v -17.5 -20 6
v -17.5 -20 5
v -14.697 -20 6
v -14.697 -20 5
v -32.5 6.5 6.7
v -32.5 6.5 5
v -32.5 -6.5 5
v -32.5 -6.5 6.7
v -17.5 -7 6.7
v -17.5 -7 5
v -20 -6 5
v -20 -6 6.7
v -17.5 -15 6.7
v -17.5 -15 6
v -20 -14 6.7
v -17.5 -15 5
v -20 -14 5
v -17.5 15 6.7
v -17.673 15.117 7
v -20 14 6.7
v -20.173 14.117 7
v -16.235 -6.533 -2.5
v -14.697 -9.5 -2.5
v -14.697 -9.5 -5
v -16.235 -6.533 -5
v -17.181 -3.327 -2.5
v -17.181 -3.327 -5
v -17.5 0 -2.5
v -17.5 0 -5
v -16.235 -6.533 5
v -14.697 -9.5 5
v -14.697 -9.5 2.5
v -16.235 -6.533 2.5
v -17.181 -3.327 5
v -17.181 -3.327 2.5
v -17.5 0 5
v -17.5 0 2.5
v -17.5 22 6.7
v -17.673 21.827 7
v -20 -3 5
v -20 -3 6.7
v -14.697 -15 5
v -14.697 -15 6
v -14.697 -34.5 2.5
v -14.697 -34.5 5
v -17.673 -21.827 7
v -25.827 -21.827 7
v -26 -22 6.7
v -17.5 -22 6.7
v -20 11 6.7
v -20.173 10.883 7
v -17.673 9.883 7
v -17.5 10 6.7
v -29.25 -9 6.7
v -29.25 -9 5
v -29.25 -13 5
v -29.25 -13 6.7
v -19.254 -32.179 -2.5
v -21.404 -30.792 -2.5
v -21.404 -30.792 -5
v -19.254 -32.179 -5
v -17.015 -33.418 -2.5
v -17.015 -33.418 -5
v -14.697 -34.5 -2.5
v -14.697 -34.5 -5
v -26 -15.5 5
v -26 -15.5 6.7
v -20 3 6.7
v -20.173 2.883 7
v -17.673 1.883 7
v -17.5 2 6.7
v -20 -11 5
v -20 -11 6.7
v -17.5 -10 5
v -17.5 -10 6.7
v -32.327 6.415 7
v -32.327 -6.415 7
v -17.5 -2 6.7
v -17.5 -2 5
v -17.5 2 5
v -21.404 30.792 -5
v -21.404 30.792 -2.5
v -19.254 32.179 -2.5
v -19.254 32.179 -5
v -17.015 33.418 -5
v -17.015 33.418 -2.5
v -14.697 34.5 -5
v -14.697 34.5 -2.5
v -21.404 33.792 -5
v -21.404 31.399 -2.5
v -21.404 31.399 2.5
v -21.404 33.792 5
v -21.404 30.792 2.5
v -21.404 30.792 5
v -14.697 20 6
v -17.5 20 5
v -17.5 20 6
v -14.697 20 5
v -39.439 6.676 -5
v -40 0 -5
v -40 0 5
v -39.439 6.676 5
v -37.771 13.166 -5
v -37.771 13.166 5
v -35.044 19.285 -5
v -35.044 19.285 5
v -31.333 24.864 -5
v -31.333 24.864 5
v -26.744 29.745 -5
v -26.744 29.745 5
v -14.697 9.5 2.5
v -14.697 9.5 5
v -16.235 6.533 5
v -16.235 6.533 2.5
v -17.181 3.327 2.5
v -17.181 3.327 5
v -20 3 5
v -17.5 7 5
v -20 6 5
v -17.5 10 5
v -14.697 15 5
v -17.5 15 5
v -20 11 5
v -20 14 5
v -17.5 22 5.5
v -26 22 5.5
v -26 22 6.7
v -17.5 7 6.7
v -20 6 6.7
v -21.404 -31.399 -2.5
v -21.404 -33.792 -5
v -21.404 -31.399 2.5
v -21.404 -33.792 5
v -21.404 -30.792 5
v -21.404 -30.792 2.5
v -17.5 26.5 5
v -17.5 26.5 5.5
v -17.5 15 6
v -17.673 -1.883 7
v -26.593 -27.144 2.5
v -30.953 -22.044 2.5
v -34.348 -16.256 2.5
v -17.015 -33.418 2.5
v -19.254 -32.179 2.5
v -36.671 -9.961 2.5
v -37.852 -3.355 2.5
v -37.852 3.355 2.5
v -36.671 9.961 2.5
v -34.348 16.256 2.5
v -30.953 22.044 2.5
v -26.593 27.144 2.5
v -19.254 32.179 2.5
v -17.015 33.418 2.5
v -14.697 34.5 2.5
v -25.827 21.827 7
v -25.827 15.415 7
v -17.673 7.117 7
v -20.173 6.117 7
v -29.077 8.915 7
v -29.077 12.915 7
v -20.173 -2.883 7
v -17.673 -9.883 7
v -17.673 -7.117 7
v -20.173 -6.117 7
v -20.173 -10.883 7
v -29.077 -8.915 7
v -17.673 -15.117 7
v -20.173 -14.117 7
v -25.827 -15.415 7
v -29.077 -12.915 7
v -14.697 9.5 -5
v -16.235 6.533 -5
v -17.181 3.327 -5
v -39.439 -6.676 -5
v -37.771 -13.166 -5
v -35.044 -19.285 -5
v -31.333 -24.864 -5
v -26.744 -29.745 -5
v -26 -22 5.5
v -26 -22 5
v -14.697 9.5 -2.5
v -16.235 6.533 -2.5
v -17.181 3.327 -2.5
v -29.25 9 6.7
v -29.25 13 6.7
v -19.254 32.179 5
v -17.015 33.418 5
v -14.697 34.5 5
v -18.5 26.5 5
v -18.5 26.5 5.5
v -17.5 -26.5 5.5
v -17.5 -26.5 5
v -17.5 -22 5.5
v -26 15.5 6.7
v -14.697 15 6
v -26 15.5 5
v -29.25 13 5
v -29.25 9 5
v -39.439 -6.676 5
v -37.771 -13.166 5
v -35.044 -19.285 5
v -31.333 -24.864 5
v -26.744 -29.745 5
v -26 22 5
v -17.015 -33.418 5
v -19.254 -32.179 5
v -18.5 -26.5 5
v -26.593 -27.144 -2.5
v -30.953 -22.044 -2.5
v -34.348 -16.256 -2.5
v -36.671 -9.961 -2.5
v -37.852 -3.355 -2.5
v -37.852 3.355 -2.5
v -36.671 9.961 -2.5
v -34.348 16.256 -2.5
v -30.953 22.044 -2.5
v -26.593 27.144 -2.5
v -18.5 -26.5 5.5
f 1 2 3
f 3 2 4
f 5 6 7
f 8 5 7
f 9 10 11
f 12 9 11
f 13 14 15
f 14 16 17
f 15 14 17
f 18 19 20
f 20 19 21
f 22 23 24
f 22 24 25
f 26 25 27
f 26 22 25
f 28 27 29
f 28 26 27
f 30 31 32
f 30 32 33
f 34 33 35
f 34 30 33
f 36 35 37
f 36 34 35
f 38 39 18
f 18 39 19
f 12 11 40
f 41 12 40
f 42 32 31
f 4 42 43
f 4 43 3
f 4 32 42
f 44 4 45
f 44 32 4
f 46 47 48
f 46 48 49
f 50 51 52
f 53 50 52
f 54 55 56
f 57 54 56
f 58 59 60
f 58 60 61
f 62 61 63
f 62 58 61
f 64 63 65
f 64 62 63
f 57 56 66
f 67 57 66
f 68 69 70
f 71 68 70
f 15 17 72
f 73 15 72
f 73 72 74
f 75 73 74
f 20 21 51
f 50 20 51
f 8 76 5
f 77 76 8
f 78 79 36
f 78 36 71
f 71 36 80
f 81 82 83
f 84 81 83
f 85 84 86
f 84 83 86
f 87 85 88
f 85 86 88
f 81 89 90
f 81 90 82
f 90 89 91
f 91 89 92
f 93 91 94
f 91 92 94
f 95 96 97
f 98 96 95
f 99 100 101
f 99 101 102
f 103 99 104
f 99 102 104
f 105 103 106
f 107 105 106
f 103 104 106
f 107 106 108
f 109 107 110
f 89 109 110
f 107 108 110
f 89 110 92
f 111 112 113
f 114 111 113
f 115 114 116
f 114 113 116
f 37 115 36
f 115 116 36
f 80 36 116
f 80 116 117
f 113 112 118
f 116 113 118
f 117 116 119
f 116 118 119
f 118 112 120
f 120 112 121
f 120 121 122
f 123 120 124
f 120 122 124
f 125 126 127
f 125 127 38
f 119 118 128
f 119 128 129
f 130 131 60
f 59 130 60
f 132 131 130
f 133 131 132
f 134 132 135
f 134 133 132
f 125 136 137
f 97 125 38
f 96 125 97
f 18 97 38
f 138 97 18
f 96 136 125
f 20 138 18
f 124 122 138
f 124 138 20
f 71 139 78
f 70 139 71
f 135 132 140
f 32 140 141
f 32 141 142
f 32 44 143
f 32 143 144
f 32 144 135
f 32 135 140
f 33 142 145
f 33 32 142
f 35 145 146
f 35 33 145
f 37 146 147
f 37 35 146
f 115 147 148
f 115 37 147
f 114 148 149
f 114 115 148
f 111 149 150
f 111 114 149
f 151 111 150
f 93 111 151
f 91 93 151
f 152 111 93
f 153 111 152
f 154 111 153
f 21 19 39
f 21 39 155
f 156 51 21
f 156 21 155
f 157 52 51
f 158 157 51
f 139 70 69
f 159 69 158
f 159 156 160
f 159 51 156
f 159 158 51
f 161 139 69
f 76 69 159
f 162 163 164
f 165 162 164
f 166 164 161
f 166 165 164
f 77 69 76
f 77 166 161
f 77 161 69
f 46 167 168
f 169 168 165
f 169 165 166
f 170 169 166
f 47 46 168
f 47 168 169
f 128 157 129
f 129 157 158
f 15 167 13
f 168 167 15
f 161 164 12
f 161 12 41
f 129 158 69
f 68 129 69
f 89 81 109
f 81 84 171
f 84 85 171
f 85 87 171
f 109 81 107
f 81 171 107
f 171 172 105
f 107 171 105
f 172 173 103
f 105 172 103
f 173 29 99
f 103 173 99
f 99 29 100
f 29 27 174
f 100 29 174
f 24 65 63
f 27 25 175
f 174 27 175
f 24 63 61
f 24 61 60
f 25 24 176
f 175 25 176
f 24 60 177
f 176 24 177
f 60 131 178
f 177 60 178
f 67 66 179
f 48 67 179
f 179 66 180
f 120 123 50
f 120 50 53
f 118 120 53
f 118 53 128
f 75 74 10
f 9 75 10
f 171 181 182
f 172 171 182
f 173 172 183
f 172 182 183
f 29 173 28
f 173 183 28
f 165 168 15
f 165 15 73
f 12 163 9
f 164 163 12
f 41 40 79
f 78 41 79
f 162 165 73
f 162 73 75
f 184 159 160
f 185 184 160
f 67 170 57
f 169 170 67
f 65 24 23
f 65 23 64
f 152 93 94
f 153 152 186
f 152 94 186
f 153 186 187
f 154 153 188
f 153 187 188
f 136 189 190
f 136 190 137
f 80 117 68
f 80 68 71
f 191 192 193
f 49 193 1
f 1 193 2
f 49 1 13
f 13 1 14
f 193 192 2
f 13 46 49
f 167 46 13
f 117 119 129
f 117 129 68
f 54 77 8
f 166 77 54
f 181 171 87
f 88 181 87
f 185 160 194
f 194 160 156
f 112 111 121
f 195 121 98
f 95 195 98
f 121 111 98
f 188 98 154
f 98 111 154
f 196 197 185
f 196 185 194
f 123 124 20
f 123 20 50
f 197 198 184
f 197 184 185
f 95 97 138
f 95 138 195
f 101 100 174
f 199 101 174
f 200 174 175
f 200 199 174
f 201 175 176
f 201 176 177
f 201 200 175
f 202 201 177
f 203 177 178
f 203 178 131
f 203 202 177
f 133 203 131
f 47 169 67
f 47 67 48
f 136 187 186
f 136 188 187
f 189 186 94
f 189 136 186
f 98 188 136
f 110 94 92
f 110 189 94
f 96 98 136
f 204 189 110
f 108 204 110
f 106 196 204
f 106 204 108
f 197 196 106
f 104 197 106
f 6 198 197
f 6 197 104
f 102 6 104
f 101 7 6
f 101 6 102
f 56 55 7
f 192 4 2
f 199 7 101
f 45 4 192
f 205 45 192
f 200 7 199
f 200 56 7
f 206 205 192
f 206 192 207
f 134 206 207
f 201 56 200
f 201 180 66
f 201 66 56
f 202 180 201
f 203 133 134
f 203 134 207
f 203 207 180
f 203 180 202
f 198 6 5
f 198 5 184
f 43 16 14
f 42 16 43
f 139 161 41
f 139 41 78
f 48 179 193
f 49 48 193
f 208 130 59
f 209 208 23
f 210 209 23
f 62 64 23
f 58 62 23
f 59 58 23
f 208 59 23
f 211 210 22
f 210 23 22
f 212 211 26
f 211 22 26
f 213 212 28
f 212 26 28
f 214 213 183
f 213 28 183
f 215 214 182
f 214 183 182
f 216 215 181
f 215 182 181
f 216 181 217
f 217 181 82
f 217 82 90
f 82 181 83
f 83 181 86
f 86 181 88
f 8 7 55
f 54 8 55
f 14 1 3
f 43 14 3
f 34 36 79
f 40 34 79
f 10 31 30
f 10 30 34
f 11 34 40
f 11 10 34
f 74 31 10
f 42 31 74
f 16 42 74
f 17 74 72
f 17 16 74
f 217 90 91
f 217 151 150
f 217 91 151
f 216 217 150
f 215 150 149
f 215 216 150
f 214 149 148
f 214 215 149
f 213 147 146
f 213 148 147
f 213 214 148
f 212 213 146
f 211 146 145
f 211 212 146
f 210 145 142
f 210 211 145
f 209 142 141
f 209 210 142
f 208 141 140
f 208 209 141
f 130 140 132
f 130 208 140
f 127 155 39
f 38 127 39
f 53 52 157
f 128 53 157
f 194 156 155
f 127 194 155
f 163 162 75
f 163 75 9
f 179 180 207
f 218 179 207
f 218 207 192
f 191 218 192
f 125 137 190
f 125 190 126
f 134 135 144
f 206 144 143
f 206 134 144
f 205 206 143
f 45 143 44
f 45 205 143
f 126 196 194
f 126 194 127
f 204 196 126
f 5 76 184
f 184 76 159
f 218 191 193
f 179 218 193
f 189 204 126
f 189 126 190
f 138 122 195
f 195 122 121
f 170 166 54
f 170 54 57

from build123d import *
from OCP.BRepFilletAPI import BRepFilletAPI_MakeChamfer

# Parameters (mm, degrees)
BOSS_EXTRUDE1_DEPTH = 5
BOSS_EXTRUDE2_DEPTH = 2
SKETCH5_W           = 2.803061543
SKETCH5_H           = 5
BOSS_EXTRUDE3_DEPTH = 1
BOSS_EXTRUDE4_DEPTH = 0.5
SKETCH7_W           = 5
SKETCH7_H           = 38
CHAMFER1_SIZE       = 0.3
CHAMFER1_SIZE2      = 0.173205081


with BuildPart() as part:
    # Sketch2 → Boss-Extrude1 (new, symmetric)
    with BuildSketch(Plane.XY):
        with BuildLine():
            Line((-14.696938457, 34.5), (-14.696938457, 9.5))
            ThreePointArc((-14.696938457, 9.5), (-16.784612343, 4.952452777), (-17.5, 0))
            Line((-17.5, 0), (-40, 0))
            ThreePointArc((-40, 0), (-35.043919369, 19.285323831), (-21.403814237, 33.791666667))
            Line((-21.403814237, 33.791666667), (-21.403814237, 30.791666667))
            ThreePointArc((-21.403814237, 30.791666667), (-18.145358092, 32.817616911), (-14.696938457, 34.5))
        make_face()
    extrude(amount=BOSS_EXTRUDE1_DEPTH, both=True)

    # Sketch4 → Boss-Extrude2 (add)
    with BuildSketch(Plane.XY.offset(5)):
        Polygon((-17.5, 15), (-20, 14), (-20, 11), (-17.5, 10), (-17.5, 7), (-20, 6), (-20, 3), (-17.5, 2), (-17.5, 0), (-32.5, 0), (-32.5, 6.5), (-29.25, 9), (-29.25, 13), (-26, 15.5), (-26, 22), (-17.5, 22), align=None)
    extrude(amount=BOSS_EXTRUDE2_DEPTH)

    # Sketch5 → Boss-Extrude3 (add)
    with BuildSketch(Plane.XY.offset(5)):
        with Locations((-16.098469229, 17.5)):
            Rectangle(SKETCH5_W, SKETCH5_H)
    extrude(amount=BOSS_EXTRUDE3_DEPTH)

    # Sketch6 → Boss-Extrude4 (add)
    with BuildSketch(Plane.XY.offset(5)):
        Polygon((-26, 22), (-18.5, 26.5), (-17.5, 26.5), (-17.5, 22), align=None)
    extrude(amount=BOSS_EXTRUDE4_DEPTH)

    # Sketch7 → Cut-Revolve1 (revolve, cut)
    with BuildSketch(Plane(origin=(0, 0, 0), x_dir=(0, 0, -1), z_dir=(1, 0, 0))):
        with Locations((0, 19)):
            Rectangle(SKETCH7_W, SKETCH7_H)
    revolve(axis=Axis((0, 0, 2.5), (0, 0, -1)), mode=Mode.SUBTRACT)

    # Mirror1: part across plane


with BuildPart() as part_1:
    add(part.part)
    add(part.part.mirror(Plane.ZX))

    # Chamfer1: one chamfer whose edges measure the first distance from different faces: ONE call of the kernel's chamfer builder (chamfer() names one face for all edges)
    chamfer1_edges_1 = [part_1.edges().sort_by_distance(p)[0] for p in [
        (-17.5, -18.5, 7),
    ]]
    chamfer1_side_1 = [part_1.faces().sort_by_distance(p)[0] for p in [
        (-17.5, -20.094444444, 6.072222222),
    ]]
    chamfer1_edges_2 = [part_1.edges().sort_by_distance(p)[0] for p in [
        (-18.75, -2.5, 7),
    ]]
    chamfer1_side_2 = [part_1.faces().sort_by_distance(p)[0] for p in [
        (-18.75, -2.5, 6),
    ]]
    chamfer1_edges_3 = [part_1.edges().sort_by_distance(p)[0] for p in [
        (-20, -4.5, 7),
    ]]
    chamfer1_side_3 = [part_1.faces().sort_by_distance(p)[0] for p in [
        (-20, -4.5, 6),
    ]]
    chamfer1_edges_4 = [part_1.edges().sort_by_distance(p)[0] for p in [
        (-18.75, -6.5, 7),
    ]]
    chamfer1_side_4 = [part_1.faces().sort_by_distance(p)[0] for p in [
        (-18.75, -6.5, 6),
    ]]
    chamfer1_edges_5 = [part_1.edges().sort_by_distance(p)[0] for p in [
        (-17.5, -8.5, 7),
    ]]
    chamfer1_side_5 = [part_1.faces().sort_by_distance(p)[0] for p in [
        (-17.5, -8.5, 6),
    ]]
    chamfer1_edges_6 = [part_1.edges().sort_by_distance(p)[0] for p in [
        (-18.75, -10.5, 7),
    ]]
    chamfer1_side_6 = [part_1.faces().sort_by_distance(p)[0] for p in [
        (-18.75, -10.5, 6),
    ]]
    chamfer1_edges_7 = [part_1.edges().sort_by_distance(p)[0] for p in [
        (-20, -12.5, 7),
    ]]
    chamfer1_side_7 = [part_1.faces().sort_by_distance(p)[0] for p in [
        (-20, -12.5, 6),
    ]]
    chamfer1_edges_8 = [part_1.edges().sort_by_distance(p)[0] for p in [
        (-18.75, -14.5, 7),
    ]]
    chamfer1_side_8 = [part_1.faces().sort_by_distance(p)[0] for p in [
        (-18.75, -14.5, 6),
    ]]
    chamfer1_edges_9 = [part_1.edges().sort_by_distance(p)[0] for p in [
        (-21.75, -22, 7),
    ]]
    chamfer1_side_9 = [part_1.faces().sort_by_distance(p)[0] for p in [
        (-21.75, -22, 6.25),
    ]]
    chamfer1_edges_10 = [part_1.edges().sort_by_distance(p)[0] for p in [
        (-26, -18.75, 7),
    ]]
    chamfer1_side_10 = [part_1.faces().sort_by_distance(p)[0] for p in [
        (-26, -18.75, 6),
    ]]
    chamfer1_edges_11 = [part_1.edges().sort_by_distance(p)[0] for p in [
        (-27.625, -14.25, 7),
    ]]
    chamfer1_side_11 = [part_1.faces().sort_by_distance(p)[0] for p in [
        (-27.625, -14.25, 6),
    ]]
    chamfer1_edges_12 = [part_1.edges().sort_by_distance(p)[0] for p in [
        (-29.25, -11, 7),
    ]]
    chamfer1_side_12 = [part_1.faces().sort_by_distance(p)[0] for p in [
        (-29.25, -11, 6),
    ]]
    chamfer1_edges_13 = [part_1.edges().sort_by_distance(p)[0] for p in [
        (-30.875, -7.75, 7),
    ]]
    chamfer1_side_13 = [part_1.faces().sort_by_distance(p)[0] for p in [
        (-30.875, -7.75, 6),
    ]]
    chamfer1_edges_14 = [part_1.edges().sort_by_distance(p)[0] for p in [
        (-17.5, 0, 7),
    ]]
    chamfer1_side_14 = [part_1.faces().sort_by_distance(p)[0] for p in [
        (-17.5, 0, 6),
    ]]
    chamfer1_edges_15 = [part_1.edges().sort_by_distance(p)[0] for p in [
        (-18.75, 2.5, 7),
    ]]
    chamfer1_side_15 = [part_1.faces().sort_by_distance(p)[0] for p in [
        (-18.75, 2.5, 6),
    ]]
    chamfer1_edges_16 = [part_1.edges().sort_by_distance(p)[0] for p in [
        (-20, 4.5, 7),
    ]]
    chamfer1_side_16 = [part_1.faces().sort_by_distance(p)[0] for p in [
        (-20, 4.5, 6),
    ]]
    chamfer1_edges_17 = [part_1.edges().sort_by_distance(p)[0] for p in [
        (-18.75, 6.5, 7),
    ]]
    chamfer1_side_17 = [part_1.faces().sort_by_distance(p)[0] for p in [
        (-18.75, 6.5, 6),
    ]]
    chamfer1_edges_18 = [part_1.edges().sort_by_distance(p)[0] for p in [
        (-17.5, 8.5, 7),
    ]]
    chamfer1_side_18 = [part_1.faces().sort_by_distance(p)[0] for p in [
        (-17.5, 8.5, 6),
    ]]
    chamfer1_edges_19 = [part_1.edges().sort_by_distance(p)[0] for p in [
        (-18.75, 10.5, 7),
    ]]
    chamfer1_side_19 = [part_1.faces().sort_by_distance(p)[0] for p in [
        (-18.75, 10.5, 6),
    ]]
    chamfer1_edges_20 = [part_1.edges().sort_by_distance(p)[0] for p in [
        (-20, 12.5, 7),
    ]]
    chamfer1_side_20 = [part_1.faces().sort_by_distance(p)[0] for p in [
        (-20, 12.5, 6),
    ]]
    chamfer1_edges_21 = [part_1.edges().sort_by_distance(p)[0] for p in [
        (-18.75, 14.5, 7),
    ]]
    chamfer1_side_21 = [part_1.faces().sort_by_distance(p)[0] for p in [
        (-18.75, 14.5, 6),
    ]]
    chamfer1_edges_22 = [part_1.edges().sort_by_distance(p)[0] for p in [
        (-17.5, 18.5, 7),
    ]]
    chamfer1_side_22 = [part_1.faces().sort_by_distance(p)[0] for p in [
        (-17.5, 20.094444444, 6.072222222),
    ]]
    chamfer1_edges_23 = [part_1.edges().sort_by_distance(p)[0] for p in [
        (-21.75, 22, 7),
    ]]
    chamfer1_side_23 = [part_1.faces().sort_by_distance(p)[0] for p in [
        (-21.75, 22, 6.25),
    ]]
    chamfer1_edges_24 = [part_1.edges().sort_by_distance(p)[0] for p in [
        (-26, 18.75, 7),
    ]]
    chamfer1_side_24 = [part_1.faces().sort_by_distance(p)[0] for p in [
        (-26, 18.75, 6),
    ]]
    chamfer1_edges_25 = [part_1.edges().sort_by_distance(p)[0] for p in [
        (-27.625, 14.25, 7),
    ]]
    chamfer1_side_25 = [part_1.faces().sort_by_distance(p)[0] for p in [
        (-27.625, 14.25, 6),
    ]]
    chamfer1_edges_26 = [part_1.edges().sort_by_distance(p)[0] for p in [
        (-29.25, 11, 7),
    ]]
    chamfer1_side_26 = [part_1.faces().sort_by_distance(p)[0] for p in [
        (-29.25, 11, 6),
    ]]
    chamfer1_edges_27 = [part_1.edges().sort_by_distance(p)[0] for p in [
        (-30.875, 7.75, 7),
    ]]
    chamfer1_side_27 = [part_1.faces().sort_by_distance(p)[0] for p in [
        (-30.875, 7.75, 6),
    ]]
    chamfer1_edges_28 = [part_1.edges().sort_by_distance(p)[0] for p in [
        (-32.5, 0, 7),
    ]]
    chamfer1_side_28 = [part_1.faces().sort_by_distance(p)[0] for p in [
        (-32.5, 0, 6),
    ]]
    chamfer1 = BRepFilletAPI_MakeChamfer(part_1.part.solid().wrapped)
    for e in chamfer1_edges_1:
        chamfer1.Add(CHAMFER1_SIZE, CHAMFER1_SIZE2, e.wrapped, chamfer1_side_1[0].wrapped)  # the first distance lies on this face
    for e in chamfer1_edges_2:
        chamfer1.Add(CHAMFER1_SIZE, CHAMFER1_SIZE2, e.wrapped, chamfer1_side_2[0].wrapped)  # the first distance lies on this face
    for e in chamfer1_edges_3:
        chamfer1.Add(CHAMFER1_SIZE, CHAMFER1_SIZE2, e.wrapped, chamfer1_side_3[0].wrapped)  # the first distance lies on this face
    for e in chamfer1_edges_4:
        chamfer1.Add(CHAMFER1_SIZE, CHAMFER1_SIZE2, e.wrapped, chamfer1_side_4[0].wrapped)  # the first distance lies on this face
    for e in chamfer1_edges_5:
        chamfer1.Add(CHAMFER1_SIZE, CHAMFER1_SIZE2, e.wrapped, chamfer1_side_5[0].wrapped)  # the first distance lies on this face
    for e in chamfer1_edges_6:
        chamfer1.Add(CHAMFER1_SIZE, CHAMFER1_SIZE2, e.wrapped, chamfer1_side_6[0].wrapped)  # the first distance lies on this face
    for e in chamfer1_edges_7:
        chamfer1.Add(CHAMFER1_SIZE, CHAMFER1_SIZE2, e.wrapped, chamfer1_side_7[0].wrapped)  # the first distance lies on this face
    for e in chamfer1_edges_8:
        chamfer1.Add(CHAMFER1_SIZE, CHAMFER1_SIZE2, e.wrapped, chamfer1_side_8[0].wrapped)  # the first distance lies on this face
    for e in chamfer1_edges_9:
        chamfer1.Add(CHAMFER1_SIZE, CHAMFER1_SIZE2, e.wrapped, chamfer1_side_9[0].wrapped)  # the first distance lies on this face
    for e in chamfer1_edges_10:
        chamfer1.Add(CHAMFER1_SIZE, CHAMFER1_SIZE2, e.wrapped, chamfer1_side_10[0].wrapped)  # the first distance lies on this face
    for e in chamfer1_edges_11:
        chamfer1.Add(CHAMFER1_SIZE, CHAMFER1_SIZE2, e.wrapped, chamfer1_side_11[0].wrapped)  # the first distance lies on this face
    for e in chamfer1_edges_12:
        chamfer1.Add(CHAMFER1_SIZE, CHAMFER1_SIZE2, e.wrapped, chamfer1_side_12[0].wrapped)  # the first distance lies on this face
    for e in chamfer1_edges_13:
        chamfer1.Add(CHAMFER1_SIZE, CHAMFER1_SIZE2, e.wrapped, chamfer1_side_13[0].wrapped)  # the first distance lies on this face
    for e in chamfer1_edges_14:
        chamfer1.Add(CHAMFER1_SIZE, CHAMFER1_SIZE2, e.wrapped, chamfer1_side_14[0].wrapped)  # the first distance lies on this face
    for e in chamfer1_edges_15:
        chamfer1.Add(CHAMFER1_SIZE, CHAMFER1_SIZE2, e.wrapped, chamfer1_side_15[0].wrapped)  # the first distance lies on this face
    for e in chamfer1_edges_16:
        chamfer1.Add(CHAMFER1_SIZE, CHAMFER1_SIZE2, e.wrapped, chamfer1_side_16[0].wrapped)  # the first distance lies on this face
    for e in chamfer1_edges_17:
        chamfer1.Add(CHAMFER1_SIZE, CHAMFER1_SIZE2, e.wrapped, chamfer1_side_17[0].wrapped)  # the first distance lies on this face
    for e in chamfer1_edges_18:
        chamfer1.Add(CHAMFER1_SIZE, CHAMFER1_SIZE2, e.wrapped, chamfer1_side_18[0].wrapped)  # the first distance lies on this face
    for e in chamfer1_edges_19:
        chamfer1.Add(CHAMFER1_SIZE, CHAMFER1_SIZE2, e.wrapped, chamfer1_side_19[0].wrapped)  # the first distance lies on this face
    for e in chamfer1_edges_20:
        chamfer1.Add(CHAMFER1_SIZE, CHAMFER1_SIZE2, e.wrapped, chamfer1_side_20[0].wrapped)  # the first distance lies on this face
    for e in chamfer1_edges_21:
        chamfer1.Add(CHAMFER1_SIZE, CHAMFER1_SIZE2, e.wrapped, chamfer1_side_21[0].wrapped)  # the first distance lies on this face
    for e in chamfer1_edges_22:
        chamfer1.Add(CHAMFER1_SIZE, CHAMFER1_SIZE2, e.wrapped, chamfer1_side_22[0].wrapped)  # the first distance lies on this face
    for e in chamfer1_edges_23:
        chamfer1.Add(CHAMFER1_SIZE, CHAMFER1_SIZE2, e.wrapped, chamfer1_side_23[0].wrapped)  # the first distance lies on this face
    for e in chamfer1_edges_24:
        chamfer1.Add(CHAMFER1_SIZE, CHAMFER1_SIZE2, e.wrapped, chamfer1_side_24[0].wrapped)  # the first distance lies on this face
    for e in chamfer1_edges_25:
        chamfer1.Add(CHAMFER1_SIZE, CHAMFER1_SIZE2, e.wrapped, chamfer1_side_25[0].wrapped)  # the first distance lies on this face
    for e in chamfer1_edges_26:
        chamfer1.Add(CHAMFER1_SIZE, CHAMFER1_SIZE2, e.wrapped, chamfer1_side_26[0].wrapped)  # the first distance lies on this face
    for e in chamfer1_edges_27:
        chamfer1.Add(CHAMFER1_SIZE, CHAMFER1_SIZE2, e.wrapped, chamfer1_side_27[0].wrapped)  # the first distance lies on this face
    for e in chamfer1_edges_28:
        chamfer1.Add(CHAMFER1_SIZE, CHAMFER1_SIZE2, e.wrapped, chamfer1_side_28[0].wrapped)  # the first distance lies on this face
    add(Compound.cast(chamfer1.Shape()), mode=Mode.REPLACE)


solid = part_1.part
